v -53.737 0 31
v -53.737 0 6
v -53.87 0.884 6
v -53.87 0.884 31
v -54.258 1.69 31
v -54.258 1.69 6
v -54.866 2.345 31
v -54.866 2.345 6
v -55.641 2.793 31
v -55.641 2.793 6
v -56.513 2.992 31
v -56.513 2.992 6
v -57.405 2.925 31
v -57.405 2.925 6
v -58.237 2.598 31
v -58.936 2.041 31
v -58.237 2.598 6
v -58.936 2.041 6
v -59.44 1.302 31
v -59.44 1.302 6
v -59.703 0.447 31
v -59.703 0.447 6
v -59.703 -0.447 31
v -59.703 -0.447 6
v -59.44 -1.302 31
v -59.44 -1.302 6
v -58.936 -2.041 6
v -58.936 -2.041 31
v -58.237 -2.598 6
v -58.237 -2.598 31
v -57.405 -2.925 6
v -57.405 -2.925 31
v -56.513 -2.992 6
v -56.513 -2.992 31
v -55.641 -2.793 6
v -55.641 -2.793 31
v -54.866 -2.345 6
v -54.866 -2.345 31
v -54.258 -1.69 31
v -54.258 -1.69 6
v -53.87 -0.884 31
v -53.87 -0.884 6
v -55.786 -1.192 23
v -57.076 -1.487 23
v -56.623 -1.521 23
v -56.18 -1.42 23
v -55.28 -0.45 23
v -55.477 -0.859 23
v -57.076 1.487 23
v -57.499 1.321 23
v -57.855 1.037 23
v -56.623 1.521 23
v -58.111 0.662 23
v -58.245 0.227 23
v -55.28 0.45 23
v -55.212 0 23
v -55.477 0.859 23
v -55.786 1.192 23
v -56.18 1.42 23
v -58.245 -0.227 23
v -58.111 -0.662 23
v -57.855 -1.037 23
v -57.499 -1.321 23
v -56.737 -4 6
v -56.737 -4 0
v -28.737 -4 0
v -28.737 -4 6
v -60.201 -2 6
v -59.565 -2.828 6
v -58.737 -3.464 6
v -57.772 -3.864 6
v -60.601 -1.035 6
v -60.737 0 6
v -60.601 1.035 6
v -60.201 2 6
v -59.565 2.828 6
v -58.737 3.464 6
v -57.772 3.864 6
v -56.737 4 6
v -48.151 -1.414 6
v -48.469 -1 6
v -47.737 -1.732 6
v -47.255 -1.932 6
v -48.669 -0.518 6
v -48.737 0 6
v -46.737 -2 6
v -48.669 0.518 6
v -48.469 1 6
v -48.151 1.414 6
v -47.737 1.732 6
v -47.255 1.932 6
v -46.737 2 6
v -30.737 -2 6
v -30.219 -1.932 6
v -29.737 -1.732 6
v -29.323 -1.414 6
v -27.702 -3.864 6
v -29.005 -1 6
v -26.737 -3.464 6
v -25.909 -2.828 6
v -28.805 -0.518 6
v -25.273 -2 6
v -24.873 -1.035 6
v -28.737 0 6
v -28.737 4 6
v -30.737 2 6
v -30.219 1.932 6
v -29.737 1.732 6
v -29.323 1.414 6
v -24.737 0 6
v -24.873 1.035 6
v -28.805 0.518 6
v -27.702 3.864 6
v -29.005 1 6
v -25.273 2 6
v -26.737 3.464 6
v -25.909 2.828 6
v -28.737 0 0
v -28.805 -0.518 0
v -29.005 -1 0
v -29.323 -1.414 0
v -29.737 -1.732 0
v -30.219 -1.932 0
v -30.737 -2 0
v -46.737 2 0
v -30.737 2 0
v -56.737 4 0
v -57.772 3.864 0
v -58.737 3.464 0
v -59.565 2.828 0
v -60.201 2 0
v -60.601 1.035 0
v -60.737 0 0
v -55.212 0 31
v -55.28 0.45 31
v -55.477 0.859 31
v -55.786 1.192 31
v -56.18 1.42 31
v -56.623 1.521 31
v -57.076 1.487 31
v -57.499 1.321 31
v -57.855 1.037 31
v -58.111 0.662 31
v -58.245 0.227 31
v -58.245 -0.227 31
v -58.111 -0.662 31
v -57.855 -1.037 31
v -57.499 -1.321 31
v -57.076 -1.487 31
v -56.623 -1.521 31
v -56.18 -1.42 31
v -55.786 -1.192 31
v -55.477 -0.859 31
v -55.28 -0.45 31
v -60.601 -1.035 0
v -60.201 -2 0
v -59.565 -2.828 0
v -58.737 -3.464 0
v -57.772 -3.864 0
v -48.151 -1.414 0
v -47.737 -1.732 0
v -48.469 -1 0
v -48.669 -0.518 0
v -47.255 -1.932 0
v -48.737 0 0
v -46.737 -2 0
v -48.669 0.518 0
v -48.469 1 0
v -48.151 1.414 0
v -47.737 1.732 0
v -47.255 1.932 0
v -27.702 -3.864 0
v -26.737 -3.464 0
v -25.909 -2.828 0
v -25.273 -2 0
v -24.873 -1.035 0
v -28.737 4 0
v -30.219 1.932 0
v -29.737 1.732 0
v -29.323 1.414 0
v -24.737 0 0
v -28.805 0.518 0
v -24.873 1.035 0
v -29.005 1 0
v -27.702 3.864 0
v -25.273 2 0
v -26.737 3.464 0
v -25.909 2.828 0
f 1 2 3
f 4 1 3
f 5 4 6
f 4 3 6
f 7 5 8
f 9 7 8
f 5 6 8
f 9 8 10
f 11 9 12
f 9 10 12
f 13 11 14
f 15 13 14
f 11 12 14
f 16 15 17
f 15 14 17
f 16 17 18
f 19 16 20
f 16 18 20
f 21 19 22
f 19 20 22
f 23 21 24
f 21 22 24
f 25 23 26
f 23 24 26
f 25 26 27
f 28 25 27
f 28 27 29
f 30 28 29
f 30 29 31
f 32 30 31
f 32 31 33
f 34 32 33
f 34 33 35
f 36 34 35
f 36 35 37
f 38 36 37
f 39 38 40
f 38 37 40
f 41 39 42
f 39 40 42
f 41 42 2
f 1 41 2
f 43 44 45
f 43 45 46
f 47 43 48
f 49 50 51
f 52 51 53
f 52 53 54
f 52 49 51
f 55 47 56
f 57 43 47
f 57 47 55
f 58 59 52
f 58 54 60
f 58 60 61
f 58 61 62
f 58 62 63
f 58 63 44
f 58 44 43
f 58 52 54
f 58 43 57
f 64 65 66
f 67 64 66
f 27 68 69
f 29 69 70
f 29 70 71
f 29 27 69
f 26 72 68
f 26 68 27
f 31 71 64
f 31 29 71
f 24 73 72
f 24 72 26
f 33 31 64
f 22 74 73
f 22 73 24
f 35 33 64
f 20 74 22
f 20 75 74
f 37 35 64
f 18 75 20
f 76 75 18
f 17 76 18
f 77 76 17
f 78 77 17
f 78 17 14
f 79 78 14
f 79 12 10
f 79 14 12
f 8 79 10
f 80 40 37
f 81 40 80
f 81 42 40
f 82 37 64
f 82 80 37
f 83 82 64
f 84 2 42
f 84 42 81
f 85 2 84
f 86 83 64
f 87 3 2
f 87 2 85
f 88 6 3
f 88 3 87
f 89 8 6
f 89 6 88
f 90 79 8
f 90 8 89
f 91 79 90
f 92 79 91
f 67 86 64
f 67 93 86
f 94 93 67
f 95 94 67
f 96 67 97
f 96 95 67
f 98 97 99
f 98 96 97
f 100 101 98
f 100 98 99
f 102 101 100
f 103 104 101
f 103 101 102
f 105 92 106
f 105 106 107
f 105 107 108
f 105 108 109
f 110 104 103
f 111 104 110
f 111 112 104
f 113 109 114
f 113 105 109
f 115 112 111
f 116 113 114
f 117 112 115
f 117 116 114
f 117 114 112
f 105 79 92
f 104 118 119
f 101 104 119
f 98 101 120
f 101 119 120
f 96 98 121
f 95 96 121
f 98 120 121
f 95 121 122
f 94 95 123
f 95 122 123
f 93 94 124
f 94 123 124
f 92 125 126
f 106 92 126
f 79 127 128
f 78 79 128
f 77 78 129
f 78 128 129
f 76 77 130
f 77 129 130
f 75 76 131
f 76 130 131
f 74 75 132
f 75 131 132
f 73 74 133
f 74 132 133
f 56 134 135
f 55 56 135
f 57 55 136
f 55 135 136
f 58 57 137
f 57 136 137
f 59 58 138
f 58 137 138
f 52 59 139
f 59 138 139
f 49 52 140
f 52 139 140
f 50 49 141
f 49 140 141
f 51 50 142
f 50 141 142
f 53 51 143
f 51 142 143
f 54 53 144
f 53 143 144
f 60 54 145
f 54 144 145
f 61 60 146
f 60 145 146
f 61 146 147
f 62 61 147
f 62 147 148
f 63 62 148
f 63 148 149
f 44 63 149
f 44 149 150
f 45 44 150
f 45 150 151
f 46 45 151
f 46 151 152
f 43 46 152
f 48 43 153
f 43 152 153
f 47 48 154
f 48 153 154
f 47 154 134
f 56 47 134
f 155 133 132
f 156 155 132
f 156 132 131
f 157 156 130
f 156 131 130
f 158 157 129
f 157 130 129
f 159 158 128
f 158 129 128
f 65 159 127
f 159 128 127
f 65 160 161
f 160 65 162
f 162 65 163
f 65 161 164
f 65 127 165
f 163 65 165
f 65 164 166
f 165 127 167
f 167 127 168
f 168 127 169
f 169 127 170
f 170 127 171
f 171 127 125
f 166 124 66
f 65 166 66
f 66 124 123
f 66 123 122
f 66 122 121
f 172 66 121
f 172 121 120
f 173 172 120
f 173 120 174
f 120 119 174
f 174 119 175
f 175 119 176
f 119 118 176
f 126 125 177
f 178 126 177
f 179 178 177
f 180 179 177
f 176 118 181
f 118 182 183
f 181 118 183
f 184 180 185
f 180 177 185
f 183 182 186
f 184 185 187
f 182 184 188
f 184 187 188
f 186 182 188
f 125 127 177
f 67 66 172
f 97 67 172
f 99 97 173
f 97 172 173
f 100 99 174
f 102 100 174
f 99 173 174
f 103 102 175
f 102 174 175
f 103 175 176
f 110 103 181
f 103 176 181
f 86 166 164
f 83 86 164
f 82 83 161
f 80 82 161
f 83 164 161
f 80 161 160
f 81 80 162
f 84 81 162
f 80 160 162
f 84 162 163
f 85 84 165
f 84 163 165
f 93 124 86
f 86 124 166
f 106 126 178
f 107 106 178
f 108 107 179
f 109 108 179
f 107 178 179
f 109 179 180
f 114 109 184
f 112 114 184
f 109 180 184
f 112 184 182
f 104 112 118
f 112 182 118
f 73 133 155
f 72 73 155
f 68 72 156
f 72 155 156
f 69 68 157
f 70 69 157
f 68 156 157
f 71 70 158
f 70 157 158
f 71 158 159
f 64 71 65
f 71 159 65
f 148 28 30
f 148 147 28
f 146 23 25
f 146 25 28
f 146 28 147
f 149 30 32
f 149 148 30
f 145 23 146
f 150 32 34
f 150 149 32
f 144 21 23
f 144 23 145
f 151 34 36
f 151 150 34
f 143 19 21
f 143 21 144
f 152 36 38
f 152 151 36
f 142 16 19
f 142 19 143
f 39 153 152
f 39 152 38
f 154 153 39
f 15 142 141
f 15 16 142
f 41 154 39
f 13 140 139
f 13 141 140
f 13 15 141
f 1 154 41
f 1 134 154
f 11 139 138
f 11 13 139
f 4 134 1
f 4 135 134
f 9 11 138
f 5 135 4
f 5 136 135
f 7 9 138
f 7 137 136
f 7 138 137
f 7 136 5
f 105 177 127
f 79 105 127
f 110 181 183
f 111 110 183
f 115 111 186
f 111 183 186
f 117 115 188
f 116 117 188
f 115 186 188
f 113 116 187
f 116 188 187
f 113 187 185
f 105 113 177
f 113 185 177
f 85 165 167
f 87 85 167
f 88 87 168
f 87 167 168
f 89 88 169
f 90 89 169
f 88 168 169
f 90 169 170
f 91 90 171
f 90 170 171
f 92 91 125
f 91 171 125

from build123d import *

# Parameters (mm, degrees)
F1_DEPTH = 6
F2_R     = 3
F3_DEPTH = 25
F4_R     = 1.525
F5_DEPTH = 8


with BuildPart() as f1:
    # F0 (on Top) → F1 (new body)
    with BuildSketch(Plane.XY):
        with BuildLine():
            Line((-28.736944, 4), (-56.736944, 4))
            ThreePointArc((-56.736944, 4), (-59.565371, 2.828427), (-60.736944, 0))
            ThreePointArc((-60.736944, 0), (-59.565371, -2.828427), (-56.736944, -4))
            Line((-56.736944, -4), (-28.736944, -4))
            ThreePointArc((-28.736944, -4), (-25.908517, -2.828427), (-24.736944, 0))
            ThreePointArc((-24.736944, 0), (-25.908517, 2.828427), (-28.736944, 4))
        make_face()
        with BuildLine():
            ThreePointArc((-48.736944, 0), (-48.151158, 1.414214), (-46.736944, 2))
            Line((-46.736944, 2), (-30.736944, 2))
            ThreePointArc((-30.736944, 2), (-29.32273, 1.414214), (-28.736944, 0))
            ThreePointArc((-28.736944, 0), (-29.32273, -1.414214), (-30.736944, -2))
            Line((-30.736944, -2), (-46.736944, -2))
            ThreePointArc((-46.736944, -2), (-48.151158, -1.414214), (-48.736944, 0))
        make_face(mode=Mode.SUBTRACT)
    extrude(amount=F1_DEPTH)

    # F2 (on face) → F3 (join)
    with BuildSketch(Plane.XY.offset(6)):
        with Locations((-56.736944, 0)):
            Circle(F2_R)
    extrude(amount=F3_DEPTH)

    # F4 (on face) → F5 (cut)
    with BuildSketch(Plane.XY.offset(31)):
        with Locations((-56.736944, 0)):
            Circle(F4_R)
    extrude(amount=-F5_DEPTH, mode=Mode.SUBTRACT)


solid = f1.part
